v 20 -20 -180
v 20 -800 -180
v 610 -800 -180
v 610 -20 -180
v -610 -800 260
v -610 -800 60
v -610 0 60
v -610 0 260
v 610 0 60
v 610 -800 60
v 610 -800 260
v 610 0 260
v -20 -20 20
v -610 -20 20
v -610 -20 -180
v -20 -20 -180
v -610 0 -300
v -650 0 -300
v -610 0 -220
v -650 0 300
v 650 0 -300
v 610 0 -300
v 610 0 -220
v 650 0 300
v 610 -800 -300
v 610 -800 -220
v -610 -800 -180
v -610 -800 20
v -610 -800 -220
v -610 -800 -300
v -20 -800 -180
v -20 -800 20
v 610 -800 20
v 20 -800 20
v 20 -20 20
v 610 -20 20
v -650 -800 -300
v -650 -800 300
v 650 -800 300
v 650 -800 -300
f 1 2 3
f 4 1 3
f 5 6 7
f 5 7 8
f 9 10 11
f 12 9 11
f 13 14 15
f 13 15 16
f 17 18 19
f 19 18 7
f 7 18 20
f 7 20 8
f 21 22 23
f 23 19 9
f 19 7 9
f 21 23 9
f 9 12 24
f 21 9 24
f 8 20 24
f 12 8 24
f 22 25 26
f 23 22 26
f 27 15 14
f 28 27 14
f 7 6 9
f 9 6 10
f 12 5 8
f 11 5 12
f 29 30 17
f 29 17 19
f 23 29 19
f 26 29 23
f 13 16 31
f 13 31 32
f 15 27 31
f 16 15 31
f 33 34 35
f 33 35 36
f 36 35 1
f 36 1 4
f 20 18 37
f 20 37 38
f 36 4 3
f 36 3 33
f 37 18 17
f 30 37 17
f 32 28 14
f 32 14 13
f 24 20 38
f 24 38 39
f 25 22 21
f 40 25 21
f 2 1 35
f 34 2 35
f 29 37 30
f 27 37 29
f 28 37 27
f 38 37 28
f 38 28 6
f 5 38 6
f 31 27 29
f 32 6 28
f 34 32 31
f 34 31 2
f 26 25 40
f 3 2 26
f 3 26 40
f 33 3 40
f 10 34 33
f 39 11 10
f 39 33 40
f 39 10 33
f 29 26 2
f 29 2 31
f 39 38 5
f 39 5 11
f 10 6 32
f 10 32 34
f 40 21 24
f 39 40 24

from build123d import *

# Parameters (mm, degrees)
F0_W     = 1300
F0_H     = 600
F1_DEPTH = 800
F2_W     = 1220
F2_H     = 80
F3_DEPTH = 800.001
F4_W     = 1220
F4_H     = 200
F5_DEPTH = 800.001
F6_W     = 590
F6_H     = 200
F7_DEPTH = 780


with BuildPart() as f1:
    # F0 (on Front) → F1 (new body)
    with BuildSketch(Plane.XZ):
        Rectangle(F0_W, F0_H)
    extrude(amount=F1_DEPTH)

    # F2 (on face) → F3 (cut, through all)
    with BuildSketch(Plane.XZ.offset(800)):
        with Locations((0, -260)):
            Rectangle(F2_W, F2_H)
    extrude(amount=-F3_DEPTH, mode=Mode.SUBTRACT)

    # F4 (on face) → F5 (cut, through all)
    with BuildSketch(Plane.XZ.offset(800)):
        with Locations((0, 160)):
            Rectangle(F4_W, F4_H)
    extrude(amount=-F5_DEPTH, mode=Mode.SUBTRACT)

    # F6 (on face) → F7 (cut)
    with BuildSketch(Plane.XZ.offset(800)):
        with Locations((-315, -80)):
            Rectangle(F6_W, F6_H)
        with Locations((315, -80)):
            Rectangle(F6_W, F6_H)
    extrude(amount=-F7_DEPTH, mode=Mode.SUBTRACT)


solid = f1.part
